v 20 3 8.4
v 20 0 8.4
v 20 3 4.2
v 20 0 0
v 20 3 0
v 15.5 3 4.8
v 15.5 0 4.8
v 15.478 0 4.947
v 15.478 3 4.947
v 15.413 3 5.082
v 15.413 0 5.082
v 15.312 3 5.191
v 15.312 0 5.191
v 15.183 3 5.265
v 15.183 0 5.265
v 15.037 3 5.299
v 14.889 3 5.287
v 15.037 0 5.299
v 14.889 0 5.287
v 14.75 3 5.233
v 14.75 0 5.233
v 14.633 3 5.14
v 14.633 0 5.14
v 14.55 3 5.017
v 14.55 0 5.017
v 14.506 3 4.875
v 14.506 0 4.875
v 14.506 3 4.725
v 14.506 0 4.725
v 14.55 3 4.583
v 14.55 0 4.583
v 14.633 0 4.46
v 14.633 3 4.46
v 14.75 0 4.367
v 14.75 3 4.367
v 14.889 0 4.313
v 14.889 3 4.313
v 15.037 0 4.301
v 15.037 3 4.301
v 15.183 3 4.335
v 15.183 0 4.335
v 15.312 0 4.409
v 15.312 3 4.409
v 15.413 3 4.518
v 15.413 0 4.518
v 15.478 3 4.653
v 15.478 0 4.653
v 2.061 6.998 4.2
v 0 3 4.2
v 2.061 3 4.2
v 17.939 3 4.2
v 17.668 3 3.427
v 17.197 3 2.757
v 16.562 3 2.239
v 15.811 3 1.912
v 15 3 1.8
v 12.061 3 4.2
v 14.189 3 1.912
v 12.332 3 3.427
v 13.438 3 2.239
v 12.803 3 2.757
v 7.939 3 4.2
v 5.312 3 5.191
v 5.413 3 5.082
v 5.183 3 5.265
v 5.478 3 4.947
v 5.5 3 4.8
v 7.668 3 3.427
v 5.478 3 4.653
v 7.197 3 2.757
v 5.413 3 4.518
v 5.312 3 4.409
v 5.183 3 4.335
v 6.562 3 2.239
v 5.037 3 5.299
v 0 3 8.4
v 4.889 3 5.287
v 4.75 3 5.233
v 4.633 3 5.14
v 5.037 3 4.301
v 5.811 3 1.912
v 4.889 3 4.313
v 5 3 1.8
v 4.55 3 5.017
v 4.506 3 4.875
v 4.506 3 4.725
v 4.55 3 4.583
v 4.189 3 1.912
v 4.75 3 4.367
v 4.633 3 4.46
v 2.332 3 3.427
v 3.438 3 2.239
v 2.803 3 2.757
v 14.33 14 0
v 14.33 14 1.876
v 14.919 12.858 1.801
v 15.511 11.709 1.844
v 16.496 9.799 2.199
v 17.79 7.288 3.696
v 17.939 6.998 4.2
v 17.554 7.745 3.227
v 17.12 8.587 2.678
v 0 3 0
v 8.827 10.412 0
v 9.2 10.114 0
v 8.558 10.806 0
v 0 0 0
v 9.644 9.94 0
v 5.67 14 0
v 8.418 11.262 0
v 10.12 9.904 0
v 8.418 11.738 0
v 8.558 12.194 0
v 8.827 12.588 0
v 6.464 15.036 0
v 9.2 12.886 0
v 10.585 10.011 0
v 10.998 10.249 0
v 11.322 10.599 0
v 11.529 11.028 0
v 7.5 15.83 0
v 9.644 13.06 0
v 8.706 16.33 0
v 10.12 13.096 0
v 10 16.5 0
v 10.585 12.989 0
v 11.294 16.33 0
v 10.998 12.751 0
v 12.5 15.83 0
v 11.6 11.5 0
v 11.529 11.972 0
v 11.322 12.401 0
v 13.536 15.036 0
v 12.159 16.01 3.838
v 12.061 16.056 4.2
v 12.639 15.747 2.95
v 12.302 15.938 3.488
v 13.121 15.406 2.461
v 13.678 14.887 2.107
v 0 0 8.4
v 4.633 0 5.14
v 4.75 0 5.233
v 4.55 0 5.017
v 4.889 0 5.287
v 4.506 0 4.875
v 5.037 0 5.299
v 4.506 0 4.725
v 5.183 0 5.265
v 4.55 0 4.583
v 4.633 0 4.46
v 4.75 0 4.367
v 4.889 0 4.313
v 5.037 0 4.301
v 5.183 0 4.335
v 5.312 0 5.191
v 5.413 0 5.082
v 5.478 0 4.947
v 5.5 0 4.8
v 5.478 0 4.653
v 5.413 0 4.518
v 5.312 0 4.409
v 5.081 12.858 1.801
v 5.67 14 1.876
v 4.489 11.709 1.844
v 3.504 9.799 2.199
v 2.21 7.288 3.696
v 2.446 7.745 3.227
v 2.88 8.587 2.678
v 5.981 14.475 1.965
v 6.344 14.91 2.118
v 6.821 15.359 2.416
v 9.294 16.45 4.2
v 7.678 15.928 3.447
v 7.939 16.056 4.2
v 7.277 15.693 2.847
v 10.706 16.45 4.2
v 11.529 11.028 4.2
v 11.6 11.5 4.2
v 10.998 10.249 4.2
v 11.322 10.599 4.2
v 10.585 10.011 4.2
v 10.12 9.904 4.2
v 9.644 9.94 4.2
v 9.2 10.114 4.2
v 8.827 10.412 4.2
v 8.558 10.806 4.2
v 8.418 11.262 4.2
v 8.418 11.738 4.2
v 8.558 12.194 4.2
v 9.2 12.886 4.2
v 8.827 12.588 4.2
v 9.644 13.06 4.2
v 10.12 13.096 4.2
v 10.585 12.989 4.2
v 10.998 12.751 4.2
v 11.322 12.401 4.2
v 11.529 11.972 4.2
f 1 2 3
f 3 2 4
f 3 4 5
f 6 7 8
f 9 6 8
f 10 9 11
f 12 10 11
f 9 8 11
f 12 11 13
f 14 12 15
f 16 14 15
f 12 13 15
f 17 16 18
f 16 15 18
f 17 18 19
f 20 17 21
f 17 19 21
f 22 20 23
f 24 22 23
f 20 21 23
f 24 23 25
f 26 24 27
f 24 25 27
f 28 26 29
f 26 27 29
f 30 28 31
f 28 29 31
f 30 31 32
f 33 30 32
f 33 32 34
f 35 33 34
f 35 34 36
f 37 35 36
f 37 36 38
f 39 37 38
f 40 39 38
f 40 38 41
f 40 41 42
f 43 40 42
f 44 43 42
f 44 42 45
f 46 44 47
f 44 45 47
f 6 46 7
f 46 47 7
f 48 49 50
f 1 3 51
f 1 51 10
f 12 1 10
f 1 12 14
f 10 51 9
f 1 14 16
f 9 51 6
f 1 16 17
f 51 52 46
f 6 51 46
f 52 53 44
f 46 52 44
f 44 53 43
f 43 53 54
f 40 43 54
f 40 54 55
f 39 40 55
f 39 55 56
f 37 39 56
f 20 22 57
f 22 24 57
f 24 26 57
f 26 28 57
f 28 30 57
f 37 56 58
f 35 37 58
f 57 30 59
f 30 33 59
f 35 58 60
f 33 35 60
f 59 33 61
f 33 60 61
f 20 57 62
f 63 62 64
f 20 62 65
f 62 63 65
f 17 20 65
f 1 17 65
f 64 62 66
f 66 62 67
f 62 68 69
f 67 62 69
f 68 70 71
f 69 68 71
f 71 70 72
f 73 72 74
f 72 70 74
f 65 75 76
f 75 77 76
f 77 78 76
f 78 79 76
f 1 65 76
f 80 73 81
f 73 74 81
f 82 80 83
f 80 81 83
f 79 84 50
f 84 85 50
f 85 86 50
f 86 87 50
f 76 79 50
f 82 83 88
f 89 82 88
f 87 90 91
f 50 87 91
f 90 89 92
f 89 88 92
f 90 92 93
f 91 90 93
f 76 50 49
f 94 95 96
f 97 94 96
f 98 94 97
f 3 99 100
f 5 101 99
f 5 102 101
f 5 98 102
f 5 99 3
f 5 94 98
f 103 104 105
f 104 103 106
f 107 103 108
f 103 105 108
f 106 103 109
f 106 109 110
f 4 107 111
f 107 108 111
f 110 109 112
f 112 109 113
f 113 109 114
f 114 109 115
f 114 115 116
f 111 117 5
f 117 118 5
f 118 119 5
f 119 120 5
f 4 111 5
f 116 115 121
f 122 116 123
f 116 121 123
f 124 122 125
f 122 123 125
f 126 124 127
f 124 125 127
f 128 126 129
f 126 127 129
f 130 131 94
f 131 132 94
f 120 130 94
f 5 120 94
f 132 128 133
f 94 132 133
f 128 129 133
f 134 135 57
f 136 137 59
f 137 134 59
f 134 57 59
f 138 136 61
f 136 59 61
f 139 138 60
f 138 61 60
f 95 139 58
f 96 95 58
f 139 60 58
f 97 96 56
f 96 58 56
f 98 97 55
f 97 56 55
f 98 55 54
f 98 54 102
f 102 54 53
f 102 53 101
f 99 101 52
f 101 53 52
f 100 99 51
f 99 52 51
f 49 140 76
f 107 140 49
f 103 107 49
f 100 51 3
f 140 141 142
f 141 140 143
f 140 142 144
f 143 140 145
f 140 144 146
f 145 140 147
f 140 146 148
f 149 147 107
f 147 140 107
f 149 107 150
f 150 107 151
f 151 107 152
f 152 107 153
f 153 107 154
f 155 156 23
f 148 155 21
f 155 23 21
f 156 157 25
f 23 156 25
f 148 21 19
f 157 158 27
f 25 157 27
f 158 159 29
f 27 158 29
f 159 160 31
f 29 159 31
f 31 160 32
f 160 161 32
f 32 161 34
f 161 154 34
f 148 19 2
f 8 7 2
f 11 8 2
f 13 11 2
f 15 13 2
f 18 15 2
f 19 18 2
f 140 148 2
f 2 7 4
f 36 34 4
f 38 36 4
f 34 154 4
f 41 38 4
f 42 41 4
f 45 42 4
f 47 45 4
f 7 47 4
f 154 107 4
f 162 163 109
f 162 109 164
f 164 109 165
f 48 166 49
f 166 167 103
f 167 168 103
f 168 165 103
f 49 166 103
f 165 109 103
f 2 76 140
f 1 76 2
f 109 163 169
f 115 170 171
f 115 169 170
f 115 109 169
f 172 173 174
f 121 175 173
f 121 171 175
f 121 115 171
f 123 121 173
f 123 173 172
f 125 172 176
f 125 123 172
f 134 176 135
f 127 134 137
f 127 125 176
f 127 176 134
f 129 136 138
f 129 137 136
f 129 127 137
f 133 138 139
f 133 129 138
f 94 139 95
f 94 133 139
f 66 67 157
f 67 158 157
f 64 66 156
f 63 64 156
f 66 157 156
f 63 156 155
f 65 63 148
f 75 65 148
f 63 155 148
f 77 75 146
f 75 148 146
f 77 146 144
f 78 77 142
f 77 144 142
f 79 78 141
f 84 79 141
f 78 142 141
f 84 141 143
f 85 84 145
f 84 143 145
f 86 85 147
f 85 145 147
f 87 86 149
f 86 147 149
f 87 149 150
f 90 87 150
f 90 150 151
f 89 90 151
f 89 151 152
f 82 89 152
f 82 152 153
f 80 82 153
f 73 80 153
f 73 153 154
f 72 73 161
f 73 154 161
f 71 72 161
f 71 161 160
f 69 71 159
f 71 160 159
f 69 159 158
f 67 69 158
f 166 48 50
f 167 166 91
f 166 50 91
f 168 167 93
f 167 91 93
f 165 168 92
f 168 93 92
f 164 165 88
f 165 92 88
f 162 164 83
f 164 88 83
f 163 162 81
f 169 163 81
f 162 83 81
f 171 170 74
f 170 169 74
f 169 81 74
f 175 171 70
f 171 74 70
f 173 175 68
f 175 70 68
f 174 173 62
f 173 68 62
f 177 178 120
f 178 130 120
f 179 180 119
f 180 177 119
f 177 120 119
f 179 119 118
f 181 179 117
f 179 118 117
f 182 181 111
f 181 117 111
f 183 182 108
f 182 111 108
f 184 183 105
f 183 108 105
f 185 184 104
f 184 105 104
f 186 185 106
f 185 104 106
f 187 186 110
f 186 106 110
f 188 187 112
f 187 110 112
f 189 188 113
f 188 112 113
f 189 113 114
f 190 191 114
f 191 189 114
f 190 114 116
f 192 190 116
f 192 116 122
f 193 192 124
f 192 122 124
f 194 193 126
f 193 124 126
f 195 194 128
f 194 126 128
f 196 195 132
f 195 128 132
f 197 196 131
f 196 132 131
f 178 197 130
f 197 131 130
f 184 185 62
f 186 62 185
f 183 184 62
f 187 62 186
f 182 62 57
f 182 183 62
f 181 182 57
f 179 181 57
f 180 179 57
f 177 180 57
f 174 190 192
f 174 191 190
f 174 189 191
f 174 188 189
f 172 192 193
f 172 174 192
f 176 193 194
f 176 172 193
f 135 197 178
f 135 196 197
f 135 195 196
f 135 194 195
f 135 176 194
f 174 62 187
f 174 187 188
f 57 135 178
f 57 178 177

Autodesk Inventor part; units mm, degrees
ref_plane "YZ Plane" through (0, 0, 0) normal (1, 0, 0) x (0, 1, 0)
ref_plane "XZ Plane" through (0, 0, 0) normal (0, 1, 0) x (-1, 0, 0)
ref_plane "XY Plane" through (0, 0, 0) normal (0, 0, 1) x (1, 0, 0)
sketch "Sketch1" plane through (0, 0, 0) normal (0, 0, 1) x (1, 0, 0)
  circle A0 centre (10, 11.5) radius 1.6
  line L0 (0, 0) -> (20.0001, 0)
  line L1 (0, 0) -> (0, 3)
  line L2 (20.0001, 0) -> (20.0001, 3)
  line L3 (0, 3) -> (16, 3) construction
  line L4 (20.0001, 3) -> (36.0001, 3) construction
  arc A1 (14.3301, 14) -> (5.6699, 14) centre (10, 11.5) ccw
  line L5 (10, 11.5) -> (5.6699, 14) construction
  line L6 (10, 11.5) -> (14.3301, 14) construction
  line L7 (5.6699, 14) -> (0, 3)
  line L8 (14.3301, 14) -> (20.0001, 3)
  dimension "d17" = 3
  dimension "d18" = 3
  dimension "d19" = 11.5
  dimension "d23" = 90
  dimension "d24" = 90
  dimension "d25" = 10
  dimension "d31" = 5
  dimension "d32" = 120
  dimension "d33" = 14
sketch "Sketch3" plane through (0, 0, 0) normal (0, 0, 1) x (1, 0, 0)
  point P0 (0, 0)
extrude "Extrusion1" add sketch "Sketch1" along normal blind 4.2
sketch "Sketch4" plane through (0, 0, 4.2) normal (0, 0, 1) x (1, 0, 0)
  line L0 (0, 3) -> (0, 0) projected
  line L1 (20.0001, 0) -> (20.0001, 3) projected
  line L2 (0, 0) -> (20.0001, 0)
  line L3 (20.0001, 0) -> (20.0001, 3)
  line L4 (3.884, 22.9404) -> (-0.9789, 3.2417) projected
  line L5 (20.0001, 3) -> (0, 3)
  line L6 (0, 3) -> (0, 0)
extrude "Extrusion2" add sketch "Sketch4" along normal blind 4.2
sketch "Sketch5" plane through (0, 0, 0) normal (0, -1, 0) x (1, 0, 0)
  circle A0 centre (5, 4.8) radius 0.5
  circle A1 centre (15, 4.8) radius 0.5
  line L0 (0, 0) -> (20.0001, 0) projected
  dimension "d13" = 1
  dimension "d14" = 1
  dimension "d38" = 4.8
  dimension "d39" = 4.8
extrude "Extrusion3" cut sketch "Sketch5" against normal blind 5.5
sketch "Sketch6" plane through (0, 3, 8.4) normal (0, 1, 0) x (1, 0, 0)
  circle A0 centre (5, 3.6) radius 0.5 projected
  circle A1 centre (5, 3.6) radius 3
  circle A2 centre (15, 3.6) radius 0.5 projected
  circle A3 centre (15, 3.6) radius 3
  line L0 (0, 8.4) -> (20.0001, 8.4) projected
  dimension "d34" = 6
  dimension "d35" = 6
  dimension "d40" = 4.8
  dimension "d41" = 4.8
extrude "Extrusion4" cut sketch "Sketch6" along normal up to next
properties part number "lower_deck_shaft_mount"
